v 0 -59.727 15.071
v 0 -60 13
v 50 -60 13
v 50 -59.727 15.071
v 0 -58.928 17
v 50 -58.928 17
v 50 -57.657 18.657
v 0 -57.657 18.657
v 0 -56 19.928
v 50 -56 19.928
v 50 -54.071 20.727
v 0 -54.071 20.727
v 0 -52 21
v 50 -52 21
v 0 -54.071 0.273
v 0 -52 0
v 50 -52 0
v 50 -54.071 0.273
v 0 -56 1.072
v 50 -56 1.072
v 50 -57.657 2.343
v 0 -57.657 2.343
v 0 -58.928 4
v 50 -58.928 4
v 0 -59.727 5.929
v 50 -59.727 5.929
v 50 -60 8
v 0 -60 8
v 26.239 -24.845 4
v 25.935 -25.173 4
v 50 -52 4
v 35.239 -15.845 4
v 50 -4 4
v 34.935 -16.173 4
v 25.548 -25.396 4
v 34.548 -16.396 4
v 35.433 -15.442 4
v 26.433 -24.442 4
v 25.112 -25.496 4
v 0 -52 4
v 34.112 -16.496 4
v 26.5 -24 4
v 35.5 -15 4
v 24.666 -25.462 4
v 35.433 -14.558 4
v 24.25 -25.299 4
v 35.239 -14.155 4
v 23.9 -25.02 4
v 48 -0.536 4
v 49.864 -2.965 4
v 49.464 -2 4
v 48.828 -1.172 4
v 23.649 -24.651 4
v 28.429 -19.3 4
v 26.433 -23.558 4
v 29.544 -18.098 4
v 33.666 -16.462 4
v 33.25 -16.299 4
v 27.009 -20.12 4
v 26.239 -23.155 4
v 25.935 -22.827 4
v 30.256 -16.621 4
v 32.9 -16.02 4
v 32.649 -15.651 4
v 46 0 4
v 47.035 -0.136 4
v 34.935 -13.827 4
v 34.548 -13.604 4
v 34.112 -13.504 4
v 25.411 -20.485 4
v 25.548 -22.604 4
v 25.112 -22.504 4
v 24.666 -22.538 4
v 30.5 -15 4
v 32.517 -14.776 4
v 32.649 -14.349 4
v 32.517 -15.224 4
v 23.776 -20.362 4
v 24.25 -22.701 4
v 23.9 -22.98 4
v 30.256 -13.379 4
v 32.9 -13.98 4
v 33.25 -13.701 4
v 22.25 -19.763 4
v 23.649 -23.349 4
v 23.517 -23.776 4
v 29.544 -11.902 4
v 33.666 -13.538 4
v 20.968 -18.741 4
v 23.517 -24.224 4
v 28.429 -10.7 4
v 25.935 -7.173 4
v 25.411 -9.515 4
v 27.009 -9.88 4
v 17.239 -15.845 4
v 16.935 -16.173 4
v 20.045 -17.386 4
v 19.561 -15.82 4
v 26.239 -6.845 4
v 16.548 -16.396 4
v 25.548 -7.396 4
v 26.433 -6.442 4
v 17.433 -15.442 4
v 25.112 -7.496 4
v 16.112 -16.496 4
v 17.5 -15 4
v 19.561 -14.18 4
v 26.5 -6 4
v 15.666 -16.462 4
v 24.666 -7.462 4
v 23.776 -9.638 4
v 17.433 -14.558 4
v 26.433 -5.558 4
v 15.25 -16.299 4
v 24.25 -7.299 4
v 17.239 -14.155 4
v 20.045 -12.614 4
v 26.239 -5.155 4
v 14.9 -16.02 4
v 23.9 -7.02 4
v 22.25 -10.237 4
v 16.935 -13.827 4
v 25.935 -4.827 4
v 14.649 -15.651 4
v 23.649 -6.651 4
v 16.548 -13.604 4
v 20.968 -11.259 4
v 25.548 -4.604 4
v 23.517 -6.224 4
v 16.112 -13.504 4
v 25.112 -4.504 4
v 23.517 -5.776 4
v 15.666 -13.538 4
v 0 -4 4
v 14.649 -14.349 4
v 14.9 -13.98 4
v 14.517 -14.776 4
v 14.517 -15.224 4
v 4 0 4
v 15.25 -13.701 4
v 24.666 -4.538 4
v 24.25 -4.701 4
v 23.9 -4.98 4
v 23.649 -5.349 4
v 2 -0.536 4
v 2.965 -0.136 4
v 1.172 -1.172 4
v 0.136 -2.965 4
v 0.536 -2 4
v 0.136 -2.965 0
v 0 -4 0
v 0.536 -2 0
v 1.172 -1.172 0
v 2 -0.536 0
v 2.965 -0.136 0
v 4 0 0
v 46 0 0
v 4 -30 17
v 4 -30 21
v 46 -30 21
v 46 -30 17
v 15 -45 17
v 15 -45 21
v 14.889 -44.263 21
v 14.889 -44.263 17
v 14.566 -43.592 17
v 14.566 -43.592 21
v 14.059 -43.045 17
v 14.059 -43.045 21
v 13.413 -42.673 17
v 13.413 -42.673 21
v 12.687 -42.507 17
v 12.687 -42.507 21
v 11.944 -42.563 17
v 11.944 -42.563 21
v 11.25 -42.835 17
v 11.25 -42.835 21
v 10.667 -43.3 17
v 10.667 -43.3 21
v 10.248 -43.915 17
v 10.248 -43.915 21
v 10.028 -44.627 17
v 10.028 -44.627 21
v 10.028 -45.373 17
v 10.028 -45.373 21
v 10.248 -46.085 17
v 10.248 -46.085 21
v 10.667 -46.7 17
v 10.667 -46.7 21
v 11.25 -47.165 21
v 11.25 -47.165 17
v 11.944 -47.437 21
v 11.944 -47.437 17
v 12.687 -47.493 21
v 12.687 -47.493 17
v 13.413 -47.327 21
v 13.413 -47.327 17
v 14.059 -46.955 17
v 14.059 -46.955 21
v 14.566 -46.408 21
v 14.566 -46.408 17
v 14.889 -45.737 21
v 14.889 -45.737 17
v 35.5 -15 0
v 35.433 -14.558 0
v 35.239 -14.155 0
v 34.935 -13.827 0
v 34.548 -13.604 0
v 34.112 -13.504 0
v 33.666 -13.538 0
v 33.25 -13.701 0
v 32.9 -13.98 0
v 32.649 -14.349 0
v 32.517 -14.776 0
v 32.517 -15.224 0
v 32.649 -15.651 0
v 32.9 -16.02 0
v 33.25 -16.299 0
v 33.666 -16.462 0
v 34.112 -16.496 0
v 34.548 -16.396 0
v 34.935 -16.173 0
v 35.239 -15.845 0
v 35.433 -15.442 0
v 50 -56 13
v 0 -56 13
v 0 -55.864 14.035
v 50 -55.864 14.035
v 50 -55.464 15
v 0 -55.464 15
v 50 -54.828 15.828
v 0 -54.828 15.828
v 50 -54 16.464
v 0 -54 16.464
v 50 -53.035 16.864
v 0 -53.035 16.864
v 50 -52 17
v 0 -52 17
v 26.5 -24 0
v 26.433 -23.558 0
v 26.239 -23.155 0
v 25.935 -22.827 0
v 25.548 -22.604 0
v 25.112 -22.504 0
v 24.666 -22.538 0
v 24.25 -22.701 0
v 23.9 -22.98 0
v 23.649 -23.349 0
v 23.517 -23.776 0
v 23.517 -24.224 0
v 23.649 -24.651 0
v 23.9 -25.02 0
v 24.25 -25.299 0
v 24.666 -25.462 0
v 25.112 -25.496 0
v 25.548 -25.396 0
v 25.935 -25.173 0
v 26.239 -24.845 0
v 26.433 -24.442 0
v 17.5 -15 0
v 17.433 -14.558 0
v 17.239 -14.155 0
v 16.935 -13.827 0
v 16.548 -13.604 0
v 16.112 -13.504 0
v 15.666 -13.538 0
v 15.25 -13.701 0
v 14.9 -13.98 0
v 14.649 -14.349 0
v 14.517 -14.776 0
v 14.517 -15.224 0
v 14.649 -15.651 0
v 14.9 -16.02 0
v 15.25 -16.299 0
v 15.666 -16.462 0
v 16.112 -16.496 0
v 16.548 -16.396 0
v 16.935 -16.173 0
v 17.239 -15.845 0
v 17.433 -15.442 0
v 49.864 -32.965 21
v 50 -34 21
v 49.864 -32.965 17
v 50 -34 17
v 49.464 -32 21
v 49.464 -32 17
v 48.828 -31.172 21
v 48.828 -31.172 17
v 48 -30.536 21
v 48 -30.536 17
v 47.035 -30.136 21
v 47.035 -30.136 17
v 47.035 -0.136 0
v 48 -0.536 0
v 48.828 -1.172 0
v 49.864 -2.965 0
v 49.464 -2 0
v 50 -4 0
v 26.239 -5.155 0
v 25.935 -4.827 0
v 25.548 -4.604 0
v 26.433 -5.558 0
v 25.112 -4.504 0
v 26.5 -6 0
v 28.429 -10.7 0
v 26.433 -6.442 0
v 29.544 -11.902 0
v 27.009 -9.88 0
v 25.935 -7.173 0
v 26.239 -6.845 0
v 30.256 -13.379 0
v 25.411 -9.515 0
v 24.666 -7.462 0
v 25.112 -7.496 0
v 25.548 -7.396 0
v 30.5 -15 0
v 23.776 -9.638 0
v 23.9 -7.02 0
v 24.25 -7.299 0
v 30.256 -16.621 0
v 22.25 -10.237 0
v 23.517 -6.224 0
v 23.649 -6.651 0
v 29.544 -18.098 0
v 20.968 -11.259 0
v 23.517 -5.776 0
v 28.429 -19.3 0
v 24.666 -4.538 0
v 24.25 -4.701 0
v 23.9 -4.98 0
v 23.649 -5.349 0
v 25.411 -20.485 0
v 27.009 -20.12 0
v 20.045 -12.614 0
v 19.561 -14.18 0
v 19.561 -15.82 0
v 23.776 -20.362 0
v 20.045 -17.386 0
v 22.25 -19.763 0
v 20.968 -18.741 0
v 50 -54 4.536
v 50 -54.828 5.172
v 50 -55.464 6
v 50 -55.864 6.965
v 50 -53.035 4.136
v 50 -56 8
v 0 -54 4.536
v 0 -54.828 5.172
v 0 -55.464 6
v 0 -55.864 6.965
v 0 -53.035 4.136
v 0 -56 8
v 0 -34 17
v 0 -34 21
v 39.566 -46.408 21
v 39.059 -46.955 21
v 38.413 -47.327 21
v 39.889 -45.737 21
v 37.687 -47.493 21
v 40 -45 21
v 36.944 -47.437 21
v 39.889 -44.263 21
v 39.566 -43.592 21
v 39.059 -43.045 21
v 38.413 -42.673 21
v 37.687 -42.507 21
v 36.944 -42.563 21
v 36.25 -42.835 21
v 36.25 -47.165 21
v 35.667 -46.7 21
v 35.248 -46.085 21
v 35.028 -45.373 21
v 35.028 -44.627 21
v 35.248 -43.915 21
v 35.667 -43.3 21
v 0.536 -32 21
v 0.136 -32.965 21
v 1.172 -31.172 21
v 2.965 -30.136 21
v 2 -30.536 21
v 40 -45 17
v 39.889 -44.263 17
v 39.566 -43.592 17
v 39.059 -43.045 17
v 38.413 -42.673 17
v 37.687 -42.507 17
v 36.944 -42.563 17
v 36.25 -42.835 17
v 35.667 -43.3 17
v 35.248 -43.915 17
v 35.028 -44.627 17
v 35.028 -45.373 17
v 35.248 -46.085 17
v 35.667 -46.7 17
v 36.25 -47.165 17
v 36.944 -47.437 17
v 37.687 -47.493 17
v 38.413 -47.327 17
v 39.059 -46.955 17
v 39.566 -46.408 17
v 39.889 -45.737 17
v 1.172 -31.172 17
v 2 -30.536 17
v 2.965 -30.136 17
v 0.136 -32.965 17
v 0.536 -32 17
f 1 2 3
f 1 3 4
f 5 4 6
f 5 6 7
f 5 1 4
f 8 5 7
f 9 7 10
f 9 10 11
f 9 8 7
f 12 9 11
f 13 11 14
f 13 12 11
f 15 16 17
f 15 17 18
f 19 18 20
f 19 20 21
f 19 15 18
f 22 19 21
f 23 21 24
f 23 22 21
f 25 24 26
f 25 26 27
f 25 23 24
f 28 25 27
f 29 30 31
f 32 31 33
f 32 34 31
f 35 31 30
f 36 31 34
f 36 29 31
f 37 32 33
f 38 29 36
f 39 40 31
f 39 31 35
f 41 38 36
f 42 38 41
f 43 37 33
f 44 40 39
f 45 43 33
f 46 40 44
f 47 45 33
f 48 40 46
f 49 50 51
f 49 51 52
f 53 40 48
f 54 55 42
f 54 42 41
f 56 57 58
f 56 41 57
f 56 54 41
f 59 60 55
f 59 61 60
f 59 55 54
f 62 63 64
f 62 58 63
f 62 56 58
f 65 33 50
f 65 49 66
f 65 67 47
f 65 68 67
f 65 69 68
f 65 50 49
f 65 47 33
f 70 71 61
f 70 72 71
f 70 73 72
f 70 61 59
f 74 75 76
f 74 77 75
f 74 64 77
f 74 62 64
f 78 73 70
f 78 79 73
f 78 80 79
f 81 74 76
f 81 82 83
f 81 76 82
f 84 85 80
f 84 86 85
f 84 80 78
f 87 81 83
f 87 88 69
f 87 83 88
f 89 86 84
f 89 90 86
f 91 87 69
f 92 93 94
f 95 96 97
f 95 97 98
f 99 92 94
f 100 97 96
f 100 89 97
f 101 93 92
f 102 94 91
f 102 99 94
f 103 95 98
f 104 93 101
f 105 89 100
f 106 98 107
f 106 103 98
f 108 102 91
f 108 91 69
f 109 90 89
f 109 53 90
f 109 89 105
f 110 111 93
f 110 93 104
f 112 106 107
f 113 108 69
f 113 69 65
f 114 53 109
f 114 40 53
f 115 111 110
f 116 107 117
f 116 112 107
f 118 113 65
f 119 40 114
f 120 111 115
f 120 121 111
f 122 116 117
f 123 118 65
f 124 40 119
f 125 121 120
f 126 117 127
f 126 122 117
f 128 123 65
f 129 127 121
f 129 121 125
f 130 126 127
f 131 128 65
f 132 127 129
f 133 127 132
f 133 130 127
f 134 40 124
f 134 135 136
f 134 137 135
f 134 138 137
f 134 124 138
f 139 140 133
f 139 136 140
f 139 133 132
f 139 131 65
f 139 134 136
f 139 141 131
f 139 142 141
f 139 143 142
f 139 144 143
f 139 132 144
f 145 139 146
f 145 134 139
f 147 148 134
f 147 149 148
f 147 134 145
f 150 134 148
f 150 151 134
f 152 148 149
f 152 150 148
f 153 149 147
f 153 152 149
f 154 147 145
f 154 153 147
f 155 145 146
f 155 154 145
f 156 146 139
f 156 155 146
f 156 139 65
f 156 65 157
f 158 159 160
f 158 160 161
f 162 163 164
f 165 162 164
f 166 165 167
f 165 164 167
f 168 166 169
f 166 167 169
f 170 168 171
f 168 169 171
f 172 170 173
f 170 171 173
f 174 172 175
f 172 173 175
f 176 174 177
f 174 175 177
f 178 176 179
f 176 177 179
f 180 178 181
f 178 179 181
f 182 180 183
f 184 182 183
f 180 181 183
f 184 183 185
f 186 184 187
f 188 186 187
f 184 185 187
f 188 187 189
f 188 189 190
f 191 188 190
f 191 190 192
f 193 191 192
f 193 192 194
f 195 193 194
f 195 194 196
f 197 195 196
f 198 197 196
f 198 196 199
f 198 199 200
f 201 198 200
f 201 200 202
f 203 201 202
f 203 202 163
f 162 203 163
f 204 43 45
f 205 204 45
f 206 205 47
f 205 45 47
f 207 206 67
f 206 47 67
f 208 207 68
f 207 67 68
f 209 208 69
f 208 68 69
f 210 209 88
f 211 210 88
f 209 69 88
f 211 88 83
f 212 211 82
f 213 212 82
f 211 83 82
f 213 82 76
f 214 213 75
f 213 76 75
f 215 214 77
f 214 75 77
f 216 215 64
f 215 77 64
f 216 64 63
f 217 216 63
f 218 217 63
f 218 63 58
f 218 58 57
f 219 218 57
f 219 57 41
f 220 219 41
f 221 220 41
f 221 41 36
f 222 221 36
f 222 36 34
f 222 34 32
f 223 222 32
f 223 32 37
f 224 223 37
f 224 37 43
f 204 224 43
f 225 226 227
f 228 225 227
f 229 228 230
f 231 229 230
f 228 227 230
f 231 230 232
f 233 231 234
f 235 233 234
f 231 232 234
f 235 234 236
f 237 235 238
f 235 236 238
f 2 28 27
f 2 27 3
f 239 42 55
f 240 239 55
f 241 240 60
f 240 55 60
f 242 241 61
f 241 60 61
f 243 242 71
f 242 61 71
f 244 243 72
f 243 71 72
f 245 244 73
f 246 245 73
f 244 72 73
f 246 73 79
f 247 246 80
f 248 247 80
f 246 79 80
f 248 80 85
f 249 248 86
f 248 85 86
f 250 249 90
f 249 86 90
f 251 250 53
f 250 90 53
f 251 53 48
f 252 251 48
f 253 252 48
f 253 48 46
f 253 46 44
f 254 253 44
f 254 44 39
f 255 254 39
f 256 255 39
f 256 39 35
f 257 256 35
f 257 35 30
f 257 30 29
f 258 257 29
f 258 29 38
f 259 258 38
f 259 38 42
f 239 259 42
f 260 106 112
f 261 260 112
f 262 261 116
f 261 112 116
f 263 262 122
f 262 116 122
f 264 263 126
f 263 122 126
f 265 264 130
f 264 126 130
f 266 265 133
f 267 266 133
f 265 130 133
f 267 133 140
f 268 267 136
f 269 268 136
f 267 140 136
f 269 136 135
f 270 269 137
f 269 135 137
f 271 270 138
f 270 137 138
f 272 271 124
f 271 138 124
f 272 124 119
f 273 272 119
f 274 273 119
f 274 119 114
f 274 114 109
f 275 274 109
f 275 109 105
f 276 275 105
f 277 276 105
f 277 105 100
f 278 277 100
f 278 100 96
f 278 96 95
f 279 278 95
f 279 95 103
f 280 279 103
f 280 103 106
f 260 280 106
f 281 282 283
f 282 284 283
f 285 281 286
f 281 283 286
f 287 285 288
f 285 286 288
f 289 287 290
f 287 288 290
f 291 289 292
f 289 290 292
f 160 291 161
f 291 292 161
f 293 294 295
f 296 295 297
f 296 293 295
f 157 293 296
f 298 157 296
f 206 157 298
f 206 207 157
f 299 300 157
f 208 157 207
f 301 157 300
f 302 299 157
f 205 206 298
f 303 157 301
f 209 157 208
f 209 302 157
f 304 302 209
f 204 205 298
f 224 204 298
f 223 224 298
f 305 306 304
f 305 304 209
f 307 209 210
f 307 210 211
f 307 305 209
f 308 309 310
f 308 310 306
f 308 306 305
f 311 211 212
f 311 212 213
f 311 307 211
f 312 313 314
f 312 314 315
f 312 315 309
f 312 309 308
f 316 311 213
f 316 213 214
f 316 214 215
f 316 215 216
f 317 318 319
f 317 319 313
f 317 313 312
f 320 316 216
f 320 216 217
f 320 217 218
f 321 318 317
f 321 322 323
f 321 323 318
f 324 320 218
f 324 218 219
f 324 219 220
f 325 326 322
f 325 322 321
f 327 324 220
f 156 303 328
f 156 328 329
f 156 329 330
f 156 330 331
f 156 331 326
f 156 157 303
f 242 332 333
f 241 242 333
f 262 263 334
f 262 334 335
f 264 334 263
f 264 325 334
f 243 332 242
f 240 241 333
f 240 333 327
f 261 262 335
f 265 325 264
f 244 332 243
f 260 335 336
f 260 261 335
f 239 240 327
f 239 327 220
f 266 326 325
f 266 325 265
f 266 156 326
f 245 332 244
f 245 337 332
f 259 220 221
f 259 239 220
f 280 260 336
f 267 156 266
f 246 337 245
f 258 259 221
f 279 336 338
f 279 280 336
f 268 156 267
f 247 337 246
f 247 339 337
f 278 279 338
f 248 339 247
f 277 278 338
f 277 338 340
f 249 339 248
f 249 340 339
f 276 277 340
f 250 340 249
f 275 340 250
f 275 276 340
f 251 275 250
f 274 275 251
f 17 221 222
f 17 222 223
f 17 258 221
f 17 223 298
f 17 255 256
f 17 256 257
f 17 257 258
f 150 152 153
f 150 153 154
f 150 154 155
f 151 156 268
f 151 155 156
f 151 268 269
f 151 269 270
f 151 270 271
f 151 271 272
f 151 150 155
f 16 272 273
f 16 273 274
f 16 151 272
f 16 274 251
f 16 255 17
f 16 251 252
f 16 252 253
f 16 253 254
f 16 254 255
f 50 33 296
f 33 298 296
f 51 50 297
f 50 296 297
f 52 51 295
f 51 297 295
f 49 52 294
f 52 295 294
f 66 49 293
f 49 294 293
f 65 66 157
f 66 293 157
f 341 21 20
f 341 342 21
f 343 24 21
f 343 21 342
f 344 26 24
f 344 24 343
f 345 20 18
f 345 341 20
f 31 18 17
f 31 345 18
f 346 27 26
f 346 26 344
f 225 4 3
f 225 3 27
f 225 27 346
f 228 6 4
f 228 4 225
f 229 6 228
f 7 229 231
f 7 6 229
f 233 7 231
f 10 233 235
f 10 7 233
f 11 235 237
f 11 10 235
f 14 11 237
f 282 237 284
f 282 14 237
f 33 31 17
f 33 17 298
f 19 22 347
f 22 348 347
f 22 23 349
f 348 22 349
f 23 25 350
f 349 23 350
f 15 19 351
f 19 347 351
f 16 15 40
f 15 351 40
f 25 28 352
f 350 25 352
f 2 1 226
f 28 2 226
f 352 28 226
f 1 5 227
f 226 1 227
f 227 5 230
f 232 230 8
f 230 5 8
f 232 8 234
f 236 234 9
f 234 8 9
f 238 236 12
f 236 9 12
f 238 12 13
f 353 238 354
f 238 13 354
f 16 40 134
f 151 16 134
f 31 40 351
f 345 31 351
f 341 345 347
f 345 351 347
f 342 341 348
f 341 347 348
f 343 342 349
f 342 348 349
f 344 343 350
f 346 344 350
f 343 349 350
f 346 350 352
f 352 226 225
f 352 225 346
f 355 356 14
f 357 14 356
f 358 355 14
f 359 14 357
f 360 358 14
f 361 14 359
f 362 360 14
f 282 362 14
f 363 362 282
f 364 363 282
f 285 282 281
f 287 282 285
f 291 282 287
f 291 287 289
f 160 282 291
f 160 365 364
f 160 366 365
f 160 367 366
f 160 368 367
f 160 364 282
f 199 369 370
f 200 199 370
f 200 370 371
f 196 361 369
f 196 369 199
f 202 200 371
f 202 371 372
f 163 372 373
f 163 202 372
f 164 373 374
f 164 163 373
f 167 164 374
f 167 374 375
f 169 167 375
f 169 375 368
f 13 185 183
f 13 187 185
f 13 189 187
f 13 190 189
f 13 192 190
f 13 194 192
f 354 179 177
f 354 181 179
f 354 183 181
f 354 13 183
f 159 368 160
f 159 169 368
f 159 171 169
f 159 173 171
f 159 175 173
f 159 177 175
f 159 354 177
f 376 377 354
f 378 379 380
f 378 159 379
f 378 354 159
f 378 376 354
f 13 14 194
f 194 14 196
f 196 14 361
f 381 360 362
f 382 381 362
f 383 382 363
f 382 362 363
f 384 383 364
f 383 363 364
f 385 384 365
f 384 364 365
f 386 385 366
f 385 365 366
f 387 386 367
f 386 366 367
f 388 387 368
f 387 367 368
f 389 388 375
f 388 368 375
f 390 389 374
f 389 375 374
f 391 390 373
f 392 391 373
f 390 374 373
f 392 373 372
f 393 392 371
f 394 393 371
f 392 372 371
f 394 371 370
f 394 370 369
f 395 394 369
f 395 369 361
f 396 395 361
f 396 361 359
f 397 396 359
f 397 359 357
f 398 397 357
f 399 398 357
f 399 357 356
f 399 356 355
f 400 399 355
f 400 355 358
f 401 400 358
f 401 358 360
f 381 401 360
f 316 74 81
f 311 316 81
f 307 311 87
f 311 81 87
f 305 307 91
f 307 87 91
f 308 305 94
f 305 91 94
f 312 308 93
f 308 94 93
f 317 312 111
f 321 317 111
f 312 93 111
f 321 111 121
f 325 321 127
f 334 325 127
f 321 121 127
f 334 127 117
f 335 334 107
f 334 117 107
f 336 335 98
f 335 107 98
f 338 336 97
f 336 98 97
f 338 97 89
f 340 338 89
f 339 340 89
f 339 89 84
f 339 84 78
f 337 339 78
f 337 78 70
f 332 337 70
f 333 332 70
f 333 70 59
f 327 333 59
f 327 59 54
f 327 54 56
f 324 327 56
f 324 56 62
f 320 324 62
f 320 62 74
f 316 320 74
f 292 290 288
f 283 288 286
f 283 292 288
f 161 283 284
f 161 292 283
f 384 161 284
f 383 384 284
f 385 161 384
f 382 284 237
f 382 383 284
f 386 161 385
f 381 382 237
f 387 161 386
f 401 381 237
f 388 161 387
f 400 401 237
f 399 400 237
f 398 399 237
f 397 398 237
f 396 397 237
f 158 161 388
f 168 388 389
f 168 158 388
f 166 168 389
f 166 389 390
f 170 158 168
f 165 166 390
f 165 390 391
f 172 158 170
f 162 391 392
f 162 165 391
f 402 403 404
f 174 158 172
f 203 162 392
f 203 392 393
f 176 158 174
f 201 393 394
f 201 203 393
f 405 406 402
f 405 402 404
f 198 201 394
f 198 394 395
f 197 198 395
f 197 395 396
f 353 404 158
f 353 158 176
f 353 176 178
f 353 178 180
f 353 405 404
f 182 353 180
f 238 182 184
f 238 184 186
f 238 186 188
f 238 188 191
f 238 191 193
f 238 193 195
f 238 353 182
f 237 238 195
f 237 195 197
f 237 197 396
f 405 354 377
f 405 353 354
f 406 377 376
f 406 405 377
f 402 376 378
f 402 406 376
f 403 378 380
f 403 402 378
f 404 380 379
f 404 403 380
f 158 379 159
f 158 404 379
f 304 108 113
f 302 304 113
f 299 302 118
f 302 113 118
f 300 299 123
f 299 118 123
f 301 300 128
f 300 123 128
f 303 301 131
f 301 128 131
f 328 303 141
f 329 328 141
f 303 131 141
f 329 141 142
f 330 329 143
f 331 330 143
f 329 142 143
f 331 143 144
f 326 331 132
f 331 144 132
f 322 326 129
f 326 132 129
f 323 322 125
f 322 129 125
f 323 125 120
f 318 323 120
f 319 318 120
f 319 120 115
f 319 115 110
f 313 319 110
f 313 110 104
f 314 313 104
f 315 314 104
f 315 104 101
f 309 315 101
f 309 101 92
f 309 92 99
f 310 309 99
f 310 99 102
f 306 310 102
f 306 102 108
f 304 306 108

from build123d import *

# Parameters (mm, degrees)
BOSS_EXTRUDE1_DEPTH    = 50
SKETCH2_R              = 5.5
SKETCH2_R_2            = 1.5
CUT_EXTRUDE1_DEPTH     = 50
SKETCH3_R              = 2.5
CUT_EXTRUDE3_DEPTH     = 10
CONVERT_SOLID1_DEPTH   = 50
CONVERT_SOLID1_2_DEPTH = 50
FILLET1_R              = 4


# Read off the part's stored shape, not the designer's step: Convert-Solid1
with BuildPart() as part:
    # Sketch1 → Boss-Extrude1 (new body)
    with BuildSketch(Plane(origin=(0, 0, 0), x_dir=(0, 0, -1), z_dir=(1, 0, 0))):
        Polygon((0, 0), (0, -60), (-21, -60), (-21, -30), (-17, -30), (-17, -56), (-4, -56), (-4, 0), align=None)
    extrude(amount=BOSS_EXTRUDE1_DEPTH)

    # Sketch2 → Cut-Extrude1 (cut)
    with BuildSketch(Plane.XY.offset(4)):
        with Locations((25, -15)):
            Circle(SKETCH2_R)
        with Locations((25, -6)):
            Circle(SKETCH2_R_2)
        with Locations((16, -15)):
            Circle(SKETCH2_R_2)
        with Locations((25, -24)):
            Circle(SKETCH2_R_2)
        with Locations((34, -15)):
            Circle(SKETCH2_R_2)
    extrude(amount=-CUT_EXTRUDE1_DEPTH, mode=Mode.SUBTRACT)

    # Sketch3 → Cut-Extrude3 (cut)
    with BuildSketch(Plane.XY.offset(21)):
        with Locations((12.5, -45)):
            Circle(SKETCH3_R)
        with Locations((37.5, -45)):
            Circle(SKETCH3_R)
    extrude(amount=-CUT_EXTRUDE3_DEPTH, mode=Mode.SUBTRACT)

    # Convert-Solid1 outline → Convert-Solid1 (cut)
    with BuildSketch(Plane.YZ):
        with BuildLine():
            Line((-60, 21), (-60, 13))
            ThreePointArc((-60, 13), (-57.656854249, 18.656854249), (-52, 21))
            Line((-52, 21), (-60, 21))
        make_face()
        with BuildLine():
            ThreePointArc((-52, 0), (-57.656854249, 2.343145751), (-60, 8))
            Line((-60, 8), (-60, 0))
            Line((-60, 0), (-52, 0))
        make_face()
    extrude(amount=CONVERT_SOLID1_DEPTH, mode=Mode.SUBTRACT)

    # Convert-Solid1 2 outline → Convert-Solid1 2 (add)
    with BuildSketch(Plane.YZ):
        with BuildLine():
            ThreePointArc((-52, 4), (-54.828427125, 5.171572875), (-56, 8))
            Line((-56, 8), (-56, 4))
            Line((-56, 4), (-52, 4))
        make_face()
        with BuildLine():
            Line((-56, 17), (-56, 13))
            ThreePointArc((-56, 13), (-54.828427125, 15.828427125), (-52, 17))
            Line((-52, 17), (-56, 17))
        make_face()
    extrude(amount=CONVERT_SOLID1_2_DEPTH)

    # Fillet1
    fillet1_edges = [part.edges().sort_by_distance(p)[0] for p in [
        (50, -30, 19),
        (0, -30, 19),
        (0, 0, 2),
        (50, 0, 2),
    ]]
    fillet(fillet1_edges, radius=FILLET1_R)


solid = part.part
